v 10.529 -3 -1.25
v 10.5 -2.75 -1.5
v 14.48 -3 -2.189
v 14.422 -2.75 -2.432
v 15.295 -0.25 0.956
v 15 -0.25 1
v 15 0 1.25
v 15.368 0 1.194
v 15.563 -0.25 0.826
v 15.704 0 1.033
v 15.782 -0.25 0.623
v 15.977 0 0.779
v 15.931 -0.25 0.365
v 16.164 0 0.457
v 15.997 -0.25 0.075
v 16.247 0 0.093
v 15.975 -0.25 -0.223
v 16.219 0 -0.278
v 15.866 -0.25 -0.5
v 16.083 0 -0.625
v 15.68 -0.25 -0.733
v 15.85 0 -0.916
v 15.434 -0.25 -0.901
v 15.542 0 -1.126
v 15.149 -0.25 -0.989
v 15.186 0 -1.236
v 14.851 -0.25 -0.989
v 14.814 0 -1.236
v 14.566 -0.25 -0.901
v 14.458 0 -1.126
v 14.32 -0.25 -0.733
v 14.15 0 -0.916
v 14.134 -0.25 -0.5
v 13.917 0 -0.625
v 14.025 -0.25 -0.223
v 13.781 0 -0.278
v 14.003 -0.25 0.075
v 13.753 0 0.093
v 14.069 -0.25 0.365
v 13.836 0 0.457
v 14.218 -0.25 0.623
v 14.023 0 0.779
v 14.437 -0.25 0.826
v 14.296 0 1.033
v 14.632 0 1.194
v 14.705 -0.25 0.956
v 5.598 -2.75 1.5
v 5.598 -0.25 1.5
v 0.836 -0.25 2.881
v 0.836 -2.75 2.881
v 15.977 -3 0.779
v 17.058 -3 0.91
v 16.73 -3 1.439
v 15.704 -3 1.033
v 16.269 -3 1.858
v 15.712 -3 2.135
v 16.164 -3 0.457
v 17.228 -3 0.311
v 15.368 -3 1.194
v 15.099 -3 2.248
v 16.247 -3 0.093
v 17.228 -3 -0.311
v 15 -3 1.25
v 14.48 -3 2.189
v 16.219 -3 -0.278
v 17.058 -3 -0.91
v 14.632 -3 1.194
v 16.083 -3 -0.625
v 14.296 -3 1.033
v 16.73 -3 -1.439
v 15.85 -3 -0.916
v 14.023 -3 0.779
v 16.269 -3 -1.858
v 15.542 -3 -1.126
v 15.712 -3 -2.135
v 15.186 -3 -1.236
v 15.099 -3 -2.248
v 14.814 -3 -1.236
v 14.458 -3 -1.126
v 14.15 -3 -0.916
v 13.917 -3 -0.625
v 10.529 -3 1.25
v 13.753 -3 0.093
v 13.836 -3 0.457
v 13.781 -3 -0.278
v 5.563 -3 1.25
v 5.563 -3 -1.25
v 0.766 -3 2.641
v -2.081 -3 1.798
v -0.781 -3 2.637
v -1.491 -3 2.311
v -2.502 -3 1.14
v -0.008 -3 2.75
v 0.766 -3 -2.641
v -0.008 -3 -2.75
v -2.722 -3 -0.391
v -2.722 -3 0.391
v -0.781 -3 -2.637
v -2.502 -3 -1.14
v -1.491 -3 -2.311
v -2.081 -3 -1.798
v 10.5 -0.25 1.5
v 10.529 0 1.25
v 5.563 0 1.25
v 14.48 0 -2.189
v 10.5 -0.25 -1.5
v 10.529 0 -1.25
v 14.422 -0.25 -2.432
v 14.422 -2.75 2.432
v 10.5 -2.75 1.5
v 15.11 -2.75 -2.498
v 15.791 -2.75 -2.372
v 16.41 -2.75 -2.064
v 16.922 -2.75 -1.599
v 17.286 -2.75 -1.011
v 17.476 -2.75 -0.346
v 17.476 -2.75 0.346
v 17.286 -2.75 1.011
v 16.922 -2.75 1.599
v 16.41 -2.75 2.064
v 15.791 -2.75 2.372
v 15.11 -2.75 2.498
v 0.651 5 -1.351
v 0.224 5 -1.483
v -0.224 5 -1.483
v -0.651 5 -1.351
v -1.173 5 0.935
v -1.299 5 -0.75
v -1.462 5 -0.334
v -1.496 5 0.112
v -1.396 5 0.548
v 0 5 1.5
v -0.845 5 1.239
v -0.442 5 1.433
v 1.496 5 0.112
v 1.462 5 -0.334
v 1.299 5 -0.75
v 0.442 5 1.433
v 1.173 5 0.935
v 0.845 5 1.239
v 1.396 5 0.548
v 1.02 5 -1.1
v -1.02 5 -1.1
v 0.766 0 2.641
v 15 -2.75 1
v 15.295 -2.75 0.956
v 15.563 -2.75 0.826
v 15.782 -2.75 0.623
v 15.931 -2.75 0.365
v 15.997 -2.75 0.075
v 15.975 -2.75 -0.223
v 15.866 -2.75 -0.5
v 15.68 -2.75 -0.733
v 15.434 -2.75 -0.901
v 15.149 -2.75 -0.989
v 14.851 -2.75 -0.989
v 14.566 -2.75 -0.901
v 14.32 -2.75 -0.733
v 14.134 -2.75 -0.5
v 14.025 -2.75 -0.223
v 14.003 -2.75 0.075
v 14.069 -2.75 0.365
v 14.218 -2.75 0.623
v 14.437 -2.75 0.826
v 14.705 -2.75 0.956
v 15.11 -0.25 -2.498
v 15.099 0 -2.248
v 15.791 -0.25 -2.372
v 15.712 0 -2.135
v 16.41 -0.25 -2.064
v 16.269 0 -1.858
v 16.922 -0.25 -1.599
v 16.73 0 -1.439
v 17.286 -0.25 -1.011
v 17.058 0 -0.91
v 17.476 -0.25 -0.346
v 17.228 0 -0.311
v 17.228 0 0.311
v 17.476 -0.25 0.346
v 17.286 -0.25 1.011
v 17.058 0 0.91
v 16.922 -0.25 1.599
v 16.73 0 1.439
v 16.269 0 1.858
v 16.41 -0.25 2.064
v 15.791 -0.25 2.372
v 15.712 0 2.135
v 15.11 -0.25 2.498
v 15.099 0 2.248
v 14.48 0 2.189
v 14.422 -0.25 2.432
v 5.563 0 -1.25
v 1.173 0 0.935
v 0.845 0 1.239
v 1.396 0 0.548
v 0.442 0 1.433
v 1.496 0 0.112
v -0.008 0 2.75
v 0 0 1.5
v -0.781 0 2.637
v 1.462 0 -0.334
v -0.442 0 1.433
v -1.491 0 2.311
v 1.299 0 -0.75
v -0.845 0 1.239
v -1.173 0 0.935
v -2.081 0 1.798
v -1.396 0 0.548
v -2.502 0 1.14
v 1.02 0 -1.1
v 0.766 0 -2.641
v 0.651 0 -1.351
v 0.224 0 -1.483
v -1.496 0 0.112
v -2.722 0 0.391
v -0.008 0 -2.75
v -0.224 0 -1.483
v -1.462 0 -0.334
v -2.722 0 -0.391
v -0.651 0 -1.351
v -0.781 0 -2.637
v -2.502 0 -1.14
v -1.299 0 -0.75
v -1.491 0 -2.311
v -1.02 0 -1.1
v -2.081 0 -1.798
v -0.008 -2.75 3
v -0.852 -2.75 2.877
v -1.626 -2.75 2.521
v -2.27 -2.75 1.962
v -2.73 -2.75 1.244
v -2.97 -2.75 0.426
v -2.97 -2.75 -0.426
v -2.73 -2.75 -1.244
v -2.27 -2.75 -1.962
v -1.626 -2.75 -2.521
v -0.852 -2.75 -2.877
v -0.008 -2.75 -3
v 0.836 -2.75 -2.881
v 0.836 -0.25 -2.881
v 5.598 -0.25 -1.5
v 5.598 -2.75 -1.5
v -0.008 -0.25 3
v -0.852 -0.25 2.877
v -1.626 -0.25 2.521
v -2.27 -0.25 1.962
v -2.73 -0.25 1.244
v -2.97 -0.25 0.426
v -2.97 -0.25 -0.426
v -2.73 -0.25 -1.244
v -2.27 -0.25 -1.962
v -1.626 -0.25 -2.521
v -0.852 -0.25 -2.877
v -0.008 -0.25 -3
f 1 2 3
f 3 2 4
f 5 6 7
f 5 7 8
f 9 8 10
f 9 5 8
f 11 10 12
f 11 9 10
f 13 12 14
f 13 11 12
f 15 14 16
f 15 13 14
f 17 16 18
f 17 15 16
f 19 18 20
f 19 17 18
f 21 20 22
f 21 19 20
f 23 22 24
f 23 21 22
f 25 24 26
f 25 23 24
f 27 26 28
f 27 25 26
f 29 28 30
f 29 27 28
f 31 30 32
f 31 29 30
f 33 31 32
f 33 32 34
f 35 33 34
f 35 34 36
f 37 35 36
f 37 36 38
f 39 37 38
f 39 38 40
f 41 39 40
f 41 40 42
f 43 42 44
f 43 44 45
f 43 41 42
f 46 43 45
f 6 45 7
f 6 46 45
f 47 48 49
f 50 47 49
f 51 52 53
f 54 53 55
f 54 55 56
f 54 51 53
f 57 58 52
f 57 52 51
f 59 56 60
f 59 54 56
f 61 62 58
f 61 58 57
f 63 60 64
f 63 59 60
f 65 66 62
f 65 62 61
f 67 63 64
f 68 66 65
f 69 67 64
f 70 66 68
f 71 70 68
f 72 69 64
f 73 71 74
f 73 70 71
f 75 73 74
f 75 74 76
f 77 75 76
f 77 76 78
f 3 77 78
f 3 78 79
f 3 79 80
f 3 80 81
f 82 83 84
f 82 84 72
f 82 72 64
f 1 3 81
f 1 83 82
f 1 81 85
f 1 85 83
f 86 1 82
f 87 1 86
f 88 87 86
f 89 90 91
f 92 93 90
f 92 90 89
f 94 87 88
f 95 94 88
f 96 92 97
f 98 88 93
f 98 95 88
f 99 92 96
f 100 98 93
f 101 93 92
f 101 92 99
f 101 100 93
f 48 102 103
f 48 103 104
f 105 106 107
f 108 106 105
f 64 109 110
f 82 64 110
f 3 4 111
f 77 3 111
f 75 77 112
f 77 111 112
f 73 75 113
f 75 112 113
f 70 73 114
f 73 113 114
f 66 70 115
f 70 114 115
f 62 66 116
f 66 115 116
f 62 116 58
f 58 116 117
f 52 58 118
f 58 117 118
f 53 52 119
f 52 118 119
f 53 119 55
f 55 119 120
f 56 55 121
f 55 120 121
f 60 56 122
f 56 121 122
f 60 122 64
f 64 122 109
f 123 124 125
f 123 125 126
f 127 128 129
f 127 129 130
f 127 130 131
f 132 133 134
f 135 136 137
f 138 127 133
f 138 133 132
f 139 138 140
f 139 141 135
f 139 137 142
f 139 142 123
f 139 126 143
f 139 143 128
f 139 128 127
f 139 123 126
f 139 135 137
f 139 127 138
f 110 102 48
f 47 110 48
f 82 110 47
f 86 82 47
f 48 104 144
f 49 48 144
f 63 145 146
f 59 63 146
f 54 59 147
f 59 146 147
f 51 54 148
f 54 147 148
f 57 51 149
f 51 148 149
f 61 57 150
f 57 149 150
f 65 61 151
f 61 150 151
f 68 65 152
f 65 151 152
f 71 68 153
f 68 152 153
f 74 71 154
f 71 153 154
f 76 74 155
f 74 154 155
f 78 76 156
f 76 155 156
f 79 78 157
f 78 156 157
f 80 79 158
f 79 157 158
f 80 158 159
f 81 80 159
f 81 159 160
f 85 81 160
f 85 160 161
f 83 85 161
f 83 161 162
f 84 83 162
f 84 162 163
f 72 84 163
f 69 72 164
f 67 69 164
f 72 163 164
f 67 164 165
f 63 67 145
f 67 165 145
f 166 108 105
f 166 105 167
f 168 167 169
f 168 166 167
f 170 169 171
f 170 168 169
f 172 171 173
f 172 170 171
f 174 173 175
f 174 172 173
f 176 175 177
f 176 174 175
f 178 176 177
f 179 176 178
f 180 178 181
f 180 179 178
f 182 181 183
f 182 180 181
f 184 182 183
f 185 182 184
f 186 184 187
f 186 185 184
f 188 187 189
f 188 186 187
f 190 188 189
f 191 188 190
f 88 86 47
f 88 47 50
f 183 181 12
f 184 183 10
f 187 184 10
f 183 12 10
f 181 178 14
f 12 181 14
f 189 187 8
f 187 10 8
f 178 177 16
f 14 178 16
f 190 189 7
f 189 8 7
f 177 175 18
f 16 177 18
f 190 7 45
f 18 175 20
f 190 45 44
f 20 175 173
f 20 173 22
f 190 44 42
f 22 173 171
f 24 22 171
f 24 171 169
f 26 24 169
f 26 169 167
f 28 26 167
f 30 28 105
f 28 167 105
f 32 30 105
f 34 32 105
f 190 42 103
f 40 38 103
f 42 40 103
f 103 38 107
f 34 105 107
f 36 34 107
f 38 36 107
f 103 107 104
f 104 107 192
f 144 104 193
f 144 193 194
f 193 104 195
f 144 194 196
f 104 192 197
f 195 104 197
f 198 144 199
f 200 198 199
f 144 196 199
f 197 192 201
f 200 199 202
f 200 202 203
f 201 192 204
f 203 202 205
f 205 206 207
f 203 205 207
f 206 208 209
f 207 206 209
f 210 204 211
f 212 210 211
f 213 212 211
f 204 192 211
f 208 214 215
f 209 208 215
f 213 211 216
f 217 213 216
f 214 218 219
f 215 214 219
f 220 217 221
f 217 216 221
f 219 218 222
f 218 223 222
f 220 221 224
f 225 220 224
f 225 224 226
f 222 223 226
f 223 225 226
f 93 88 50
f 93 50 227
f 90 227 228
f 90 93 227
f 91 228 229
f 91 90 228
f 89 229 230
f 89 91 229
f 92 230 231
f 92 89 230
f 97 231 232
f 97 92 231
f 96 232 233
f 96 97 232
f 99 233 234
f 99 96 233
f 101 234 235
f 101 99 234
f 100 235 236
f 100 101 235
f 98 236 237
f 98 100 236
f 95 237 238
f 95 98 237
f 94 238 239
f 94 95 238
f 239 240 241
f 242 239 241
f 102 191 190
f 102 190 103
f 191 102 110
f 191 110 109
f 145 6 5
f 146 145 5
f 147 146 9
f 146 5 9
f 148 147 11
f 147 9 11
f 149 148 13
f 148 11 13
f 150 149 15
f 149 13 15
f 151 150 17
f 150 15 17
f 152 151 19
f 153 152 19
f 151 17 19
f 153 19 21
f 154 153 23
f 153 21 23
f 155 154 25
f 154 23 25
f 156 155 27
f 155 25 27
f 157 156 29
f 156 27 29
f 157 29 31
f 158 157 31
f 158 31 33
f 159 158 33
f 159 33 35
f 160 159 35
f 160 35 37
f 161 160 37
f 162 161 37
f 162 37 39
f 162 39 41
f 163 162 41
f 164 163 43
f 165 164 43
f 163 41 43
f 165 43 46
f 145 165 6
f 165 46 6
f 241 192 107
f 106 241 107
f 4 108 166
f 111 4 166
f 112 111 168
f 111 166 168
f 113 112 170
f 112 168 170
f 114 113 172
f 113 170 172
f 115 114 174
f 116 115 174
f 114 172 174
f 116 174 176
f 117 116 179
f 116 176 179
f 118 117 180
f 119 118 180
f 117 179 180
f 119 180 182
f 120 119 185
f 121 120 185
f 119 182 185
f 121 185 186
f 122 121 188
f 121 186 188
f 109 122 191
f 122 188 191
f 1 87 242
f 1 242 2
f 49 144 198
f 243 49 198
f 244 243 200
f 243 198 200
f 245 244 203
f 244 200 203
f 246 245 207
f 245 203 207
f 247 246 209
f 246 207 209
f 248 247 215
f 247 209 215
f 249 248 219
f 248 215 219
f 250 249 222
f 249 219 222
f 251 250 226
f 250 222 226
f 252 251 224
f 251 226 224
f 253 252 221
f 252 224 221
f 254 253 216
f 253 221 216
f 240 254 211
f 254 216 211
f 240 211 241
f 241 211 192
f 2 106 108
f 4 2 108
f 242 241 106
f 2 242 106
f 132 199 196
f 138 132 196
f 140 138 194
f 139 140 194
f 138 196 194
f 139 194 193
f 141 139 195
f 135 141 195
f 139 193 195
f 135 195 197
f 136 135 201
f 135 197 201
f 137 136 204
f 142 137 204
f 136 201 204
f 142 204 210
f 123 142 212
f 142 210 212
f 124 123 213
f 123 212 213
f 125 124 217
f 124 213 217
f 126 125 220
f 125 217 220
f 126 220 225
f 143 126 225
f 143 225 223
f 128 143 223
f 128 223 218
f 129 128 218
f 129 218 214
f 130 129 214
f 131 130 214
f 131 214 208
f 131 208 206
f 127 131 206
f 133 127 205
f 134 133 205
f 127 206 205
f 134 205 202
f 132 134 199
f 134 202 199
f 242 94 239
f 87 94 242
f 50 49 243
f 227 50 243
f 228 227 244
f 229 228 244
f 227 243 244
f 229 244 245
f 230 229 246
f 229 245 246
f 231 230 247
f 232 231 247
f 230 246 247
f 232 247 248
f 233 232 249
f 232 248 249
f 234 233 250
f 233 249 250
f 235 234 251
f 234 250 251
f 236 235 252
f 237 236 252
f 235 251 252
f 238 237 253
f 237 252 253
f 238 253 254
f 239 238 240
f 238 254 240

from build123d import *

# Parameters (mm, degrees)
SKETCH_1_R          = 1.5
EXTRUDE_1_DEPTH     = 5
EXTRUDE_3_DEPTH     = 3
SKETCH_5_R          = 1
CUT_EXTRUDE_2_DEPTH = 3
EXTRUDE_4_DEPTH     = 3
EXTRUDE_5_DEPTH     = 3
CHAMFER_2_SIZE      = 0.25


with BuildPart() as part:
    # 草图1 → 凸台-拉伸1 (new body)
    with BuildSketch(Plane(origin=(0, 0, 0), x_dir=(1, 0, 0), z_dir=(0, 1, 0))):
        with Locations(Location((0, 0, 0), (0, 0, 270))):
            Circle(SKETCH_1_R)
    extrude(amount=EXTRUDE_1_DEPTH)

    # 草图4 → 凸台-拉伸3 (add)
    with BuildSketch(Plane(origin=(0, 0, 0), x_dir=(1, 0, 0), z_dir=(0, 1, 0))):
        with BuildLine():
            Line((2.598076211, 1.5), (13, 1.5))
            ThreePointArc((13, 1.5), (17.5, 0), (13, -1.5))
            Line((13, -1.5), (2.598076211, -1.5))
            ThreePointArc((2.598076211, -1.5), (-3, 0), (2.598076211, 1.5))
        make_face()
    extrude(amount=-EXTRUDE_3_DEPTH)

    # 草图5 → 切除-拉伸2 (cut)
    with BuildSketch(Plane(origin=(0, 0, 0), x_dir=(1, 0, 0), z_dir=(0, 1, 0))):
        with Locations(Location((15, 0, 0), (0, 0, 270))):
            Circle(SKETCH_5_R)
    extrude(amount=-CUT_EXTRUDE_2_DEPTH, mode=Mode.SUBTRACT)

    # 草图7 → 凸台-拉伸4 (add)
    with BuildSketch(Plane(origin=(0, 0, 0), x_dir=(1, 0, 0), z_dir=(0, 1, 0))):
        with BuildLine():
            Line((10.5, 1.5), (14.421854812, 2.432231104))
            ThreePointArc((14.421854812, 2.432231104), (13.629244055, 2.090700395), (13, 1.5))
            Line((13, 1.5), (10.5, 1.5))
        make_face()
        with BuildLine():
            Line((10.5, -1.5), (14.421854812, -2.432231104))
            ThreePointArc((14.421854812, -2.432231104), (13.629244055, -2.090700395), (13, -1.5))
            Line((13, -1.5), (10.5, -1.5))
        make_face()
    extrude(amount=-EXTRUDE_4_DEPTH)

    # 草图9 → 凸台-拉伸5 (add)
    with BuildSketch(Plane(origin=(0, 0, 0), x_dir=(1, 0, 0), z_dir=(0, 1, 0))):
        with BuildLine():
            Line((5.598076211, 1.5), (2.598076211, 1.5))
            ThreePointArc((2.598076211, 1.5), (1.850570943, 2.36122578), (0.835663526, 2.881261264))
            Line((0.835663526, 2.881261264), (5.598076211, 1.5))
        make_face()
        with BuildLine():
            Line((2.598076211, -1.5), (5.598076211, -1.5))
            Line((5.598076211, -1.5), (0.835663526, -2.881261264))
            ThreePointArc((0.835663526, -2.881261264), (1.850570943, -2.36122578), (2.598076211, -1.5))
        make_face()
    extrude(amount=-EXTRUDE_5_DEPTH)

    # 倒角2
    chamfer_2_edges = [part.edges().sort_by_distance(p)[0] for p in [
        (15, 0, -1),
        (15, -3, -1),
        (17.5, 0, 0),
        (17.5, -3, 0),
        (12.460927406, 0, 1.966115552),
        (12.460927406, -3, 1.966115552),
        (8.049038106, 0, -1.5),
        (8.049038106, -3, -1.5),
        (12.460927406, 0, -1.966115552),
        (12.460927406, -3, -1.966115552),
        (-3, 0, 0),
        (-3, -3, 0),
        (3.216869869, 0, -2.190630632),
        (3.216869869, -3, -2.190630632),
        (8.049038106, 0, 1.5),
        (8.049038106, -3, 1.5),
        (3.216869869, 0, 2.190630632),
        (3.216869869, -3, 2.190630632),
    ]]
    chamfer(chamfer_2_edges, length=CHAMFER_2_SIZE)


solid = part.part
